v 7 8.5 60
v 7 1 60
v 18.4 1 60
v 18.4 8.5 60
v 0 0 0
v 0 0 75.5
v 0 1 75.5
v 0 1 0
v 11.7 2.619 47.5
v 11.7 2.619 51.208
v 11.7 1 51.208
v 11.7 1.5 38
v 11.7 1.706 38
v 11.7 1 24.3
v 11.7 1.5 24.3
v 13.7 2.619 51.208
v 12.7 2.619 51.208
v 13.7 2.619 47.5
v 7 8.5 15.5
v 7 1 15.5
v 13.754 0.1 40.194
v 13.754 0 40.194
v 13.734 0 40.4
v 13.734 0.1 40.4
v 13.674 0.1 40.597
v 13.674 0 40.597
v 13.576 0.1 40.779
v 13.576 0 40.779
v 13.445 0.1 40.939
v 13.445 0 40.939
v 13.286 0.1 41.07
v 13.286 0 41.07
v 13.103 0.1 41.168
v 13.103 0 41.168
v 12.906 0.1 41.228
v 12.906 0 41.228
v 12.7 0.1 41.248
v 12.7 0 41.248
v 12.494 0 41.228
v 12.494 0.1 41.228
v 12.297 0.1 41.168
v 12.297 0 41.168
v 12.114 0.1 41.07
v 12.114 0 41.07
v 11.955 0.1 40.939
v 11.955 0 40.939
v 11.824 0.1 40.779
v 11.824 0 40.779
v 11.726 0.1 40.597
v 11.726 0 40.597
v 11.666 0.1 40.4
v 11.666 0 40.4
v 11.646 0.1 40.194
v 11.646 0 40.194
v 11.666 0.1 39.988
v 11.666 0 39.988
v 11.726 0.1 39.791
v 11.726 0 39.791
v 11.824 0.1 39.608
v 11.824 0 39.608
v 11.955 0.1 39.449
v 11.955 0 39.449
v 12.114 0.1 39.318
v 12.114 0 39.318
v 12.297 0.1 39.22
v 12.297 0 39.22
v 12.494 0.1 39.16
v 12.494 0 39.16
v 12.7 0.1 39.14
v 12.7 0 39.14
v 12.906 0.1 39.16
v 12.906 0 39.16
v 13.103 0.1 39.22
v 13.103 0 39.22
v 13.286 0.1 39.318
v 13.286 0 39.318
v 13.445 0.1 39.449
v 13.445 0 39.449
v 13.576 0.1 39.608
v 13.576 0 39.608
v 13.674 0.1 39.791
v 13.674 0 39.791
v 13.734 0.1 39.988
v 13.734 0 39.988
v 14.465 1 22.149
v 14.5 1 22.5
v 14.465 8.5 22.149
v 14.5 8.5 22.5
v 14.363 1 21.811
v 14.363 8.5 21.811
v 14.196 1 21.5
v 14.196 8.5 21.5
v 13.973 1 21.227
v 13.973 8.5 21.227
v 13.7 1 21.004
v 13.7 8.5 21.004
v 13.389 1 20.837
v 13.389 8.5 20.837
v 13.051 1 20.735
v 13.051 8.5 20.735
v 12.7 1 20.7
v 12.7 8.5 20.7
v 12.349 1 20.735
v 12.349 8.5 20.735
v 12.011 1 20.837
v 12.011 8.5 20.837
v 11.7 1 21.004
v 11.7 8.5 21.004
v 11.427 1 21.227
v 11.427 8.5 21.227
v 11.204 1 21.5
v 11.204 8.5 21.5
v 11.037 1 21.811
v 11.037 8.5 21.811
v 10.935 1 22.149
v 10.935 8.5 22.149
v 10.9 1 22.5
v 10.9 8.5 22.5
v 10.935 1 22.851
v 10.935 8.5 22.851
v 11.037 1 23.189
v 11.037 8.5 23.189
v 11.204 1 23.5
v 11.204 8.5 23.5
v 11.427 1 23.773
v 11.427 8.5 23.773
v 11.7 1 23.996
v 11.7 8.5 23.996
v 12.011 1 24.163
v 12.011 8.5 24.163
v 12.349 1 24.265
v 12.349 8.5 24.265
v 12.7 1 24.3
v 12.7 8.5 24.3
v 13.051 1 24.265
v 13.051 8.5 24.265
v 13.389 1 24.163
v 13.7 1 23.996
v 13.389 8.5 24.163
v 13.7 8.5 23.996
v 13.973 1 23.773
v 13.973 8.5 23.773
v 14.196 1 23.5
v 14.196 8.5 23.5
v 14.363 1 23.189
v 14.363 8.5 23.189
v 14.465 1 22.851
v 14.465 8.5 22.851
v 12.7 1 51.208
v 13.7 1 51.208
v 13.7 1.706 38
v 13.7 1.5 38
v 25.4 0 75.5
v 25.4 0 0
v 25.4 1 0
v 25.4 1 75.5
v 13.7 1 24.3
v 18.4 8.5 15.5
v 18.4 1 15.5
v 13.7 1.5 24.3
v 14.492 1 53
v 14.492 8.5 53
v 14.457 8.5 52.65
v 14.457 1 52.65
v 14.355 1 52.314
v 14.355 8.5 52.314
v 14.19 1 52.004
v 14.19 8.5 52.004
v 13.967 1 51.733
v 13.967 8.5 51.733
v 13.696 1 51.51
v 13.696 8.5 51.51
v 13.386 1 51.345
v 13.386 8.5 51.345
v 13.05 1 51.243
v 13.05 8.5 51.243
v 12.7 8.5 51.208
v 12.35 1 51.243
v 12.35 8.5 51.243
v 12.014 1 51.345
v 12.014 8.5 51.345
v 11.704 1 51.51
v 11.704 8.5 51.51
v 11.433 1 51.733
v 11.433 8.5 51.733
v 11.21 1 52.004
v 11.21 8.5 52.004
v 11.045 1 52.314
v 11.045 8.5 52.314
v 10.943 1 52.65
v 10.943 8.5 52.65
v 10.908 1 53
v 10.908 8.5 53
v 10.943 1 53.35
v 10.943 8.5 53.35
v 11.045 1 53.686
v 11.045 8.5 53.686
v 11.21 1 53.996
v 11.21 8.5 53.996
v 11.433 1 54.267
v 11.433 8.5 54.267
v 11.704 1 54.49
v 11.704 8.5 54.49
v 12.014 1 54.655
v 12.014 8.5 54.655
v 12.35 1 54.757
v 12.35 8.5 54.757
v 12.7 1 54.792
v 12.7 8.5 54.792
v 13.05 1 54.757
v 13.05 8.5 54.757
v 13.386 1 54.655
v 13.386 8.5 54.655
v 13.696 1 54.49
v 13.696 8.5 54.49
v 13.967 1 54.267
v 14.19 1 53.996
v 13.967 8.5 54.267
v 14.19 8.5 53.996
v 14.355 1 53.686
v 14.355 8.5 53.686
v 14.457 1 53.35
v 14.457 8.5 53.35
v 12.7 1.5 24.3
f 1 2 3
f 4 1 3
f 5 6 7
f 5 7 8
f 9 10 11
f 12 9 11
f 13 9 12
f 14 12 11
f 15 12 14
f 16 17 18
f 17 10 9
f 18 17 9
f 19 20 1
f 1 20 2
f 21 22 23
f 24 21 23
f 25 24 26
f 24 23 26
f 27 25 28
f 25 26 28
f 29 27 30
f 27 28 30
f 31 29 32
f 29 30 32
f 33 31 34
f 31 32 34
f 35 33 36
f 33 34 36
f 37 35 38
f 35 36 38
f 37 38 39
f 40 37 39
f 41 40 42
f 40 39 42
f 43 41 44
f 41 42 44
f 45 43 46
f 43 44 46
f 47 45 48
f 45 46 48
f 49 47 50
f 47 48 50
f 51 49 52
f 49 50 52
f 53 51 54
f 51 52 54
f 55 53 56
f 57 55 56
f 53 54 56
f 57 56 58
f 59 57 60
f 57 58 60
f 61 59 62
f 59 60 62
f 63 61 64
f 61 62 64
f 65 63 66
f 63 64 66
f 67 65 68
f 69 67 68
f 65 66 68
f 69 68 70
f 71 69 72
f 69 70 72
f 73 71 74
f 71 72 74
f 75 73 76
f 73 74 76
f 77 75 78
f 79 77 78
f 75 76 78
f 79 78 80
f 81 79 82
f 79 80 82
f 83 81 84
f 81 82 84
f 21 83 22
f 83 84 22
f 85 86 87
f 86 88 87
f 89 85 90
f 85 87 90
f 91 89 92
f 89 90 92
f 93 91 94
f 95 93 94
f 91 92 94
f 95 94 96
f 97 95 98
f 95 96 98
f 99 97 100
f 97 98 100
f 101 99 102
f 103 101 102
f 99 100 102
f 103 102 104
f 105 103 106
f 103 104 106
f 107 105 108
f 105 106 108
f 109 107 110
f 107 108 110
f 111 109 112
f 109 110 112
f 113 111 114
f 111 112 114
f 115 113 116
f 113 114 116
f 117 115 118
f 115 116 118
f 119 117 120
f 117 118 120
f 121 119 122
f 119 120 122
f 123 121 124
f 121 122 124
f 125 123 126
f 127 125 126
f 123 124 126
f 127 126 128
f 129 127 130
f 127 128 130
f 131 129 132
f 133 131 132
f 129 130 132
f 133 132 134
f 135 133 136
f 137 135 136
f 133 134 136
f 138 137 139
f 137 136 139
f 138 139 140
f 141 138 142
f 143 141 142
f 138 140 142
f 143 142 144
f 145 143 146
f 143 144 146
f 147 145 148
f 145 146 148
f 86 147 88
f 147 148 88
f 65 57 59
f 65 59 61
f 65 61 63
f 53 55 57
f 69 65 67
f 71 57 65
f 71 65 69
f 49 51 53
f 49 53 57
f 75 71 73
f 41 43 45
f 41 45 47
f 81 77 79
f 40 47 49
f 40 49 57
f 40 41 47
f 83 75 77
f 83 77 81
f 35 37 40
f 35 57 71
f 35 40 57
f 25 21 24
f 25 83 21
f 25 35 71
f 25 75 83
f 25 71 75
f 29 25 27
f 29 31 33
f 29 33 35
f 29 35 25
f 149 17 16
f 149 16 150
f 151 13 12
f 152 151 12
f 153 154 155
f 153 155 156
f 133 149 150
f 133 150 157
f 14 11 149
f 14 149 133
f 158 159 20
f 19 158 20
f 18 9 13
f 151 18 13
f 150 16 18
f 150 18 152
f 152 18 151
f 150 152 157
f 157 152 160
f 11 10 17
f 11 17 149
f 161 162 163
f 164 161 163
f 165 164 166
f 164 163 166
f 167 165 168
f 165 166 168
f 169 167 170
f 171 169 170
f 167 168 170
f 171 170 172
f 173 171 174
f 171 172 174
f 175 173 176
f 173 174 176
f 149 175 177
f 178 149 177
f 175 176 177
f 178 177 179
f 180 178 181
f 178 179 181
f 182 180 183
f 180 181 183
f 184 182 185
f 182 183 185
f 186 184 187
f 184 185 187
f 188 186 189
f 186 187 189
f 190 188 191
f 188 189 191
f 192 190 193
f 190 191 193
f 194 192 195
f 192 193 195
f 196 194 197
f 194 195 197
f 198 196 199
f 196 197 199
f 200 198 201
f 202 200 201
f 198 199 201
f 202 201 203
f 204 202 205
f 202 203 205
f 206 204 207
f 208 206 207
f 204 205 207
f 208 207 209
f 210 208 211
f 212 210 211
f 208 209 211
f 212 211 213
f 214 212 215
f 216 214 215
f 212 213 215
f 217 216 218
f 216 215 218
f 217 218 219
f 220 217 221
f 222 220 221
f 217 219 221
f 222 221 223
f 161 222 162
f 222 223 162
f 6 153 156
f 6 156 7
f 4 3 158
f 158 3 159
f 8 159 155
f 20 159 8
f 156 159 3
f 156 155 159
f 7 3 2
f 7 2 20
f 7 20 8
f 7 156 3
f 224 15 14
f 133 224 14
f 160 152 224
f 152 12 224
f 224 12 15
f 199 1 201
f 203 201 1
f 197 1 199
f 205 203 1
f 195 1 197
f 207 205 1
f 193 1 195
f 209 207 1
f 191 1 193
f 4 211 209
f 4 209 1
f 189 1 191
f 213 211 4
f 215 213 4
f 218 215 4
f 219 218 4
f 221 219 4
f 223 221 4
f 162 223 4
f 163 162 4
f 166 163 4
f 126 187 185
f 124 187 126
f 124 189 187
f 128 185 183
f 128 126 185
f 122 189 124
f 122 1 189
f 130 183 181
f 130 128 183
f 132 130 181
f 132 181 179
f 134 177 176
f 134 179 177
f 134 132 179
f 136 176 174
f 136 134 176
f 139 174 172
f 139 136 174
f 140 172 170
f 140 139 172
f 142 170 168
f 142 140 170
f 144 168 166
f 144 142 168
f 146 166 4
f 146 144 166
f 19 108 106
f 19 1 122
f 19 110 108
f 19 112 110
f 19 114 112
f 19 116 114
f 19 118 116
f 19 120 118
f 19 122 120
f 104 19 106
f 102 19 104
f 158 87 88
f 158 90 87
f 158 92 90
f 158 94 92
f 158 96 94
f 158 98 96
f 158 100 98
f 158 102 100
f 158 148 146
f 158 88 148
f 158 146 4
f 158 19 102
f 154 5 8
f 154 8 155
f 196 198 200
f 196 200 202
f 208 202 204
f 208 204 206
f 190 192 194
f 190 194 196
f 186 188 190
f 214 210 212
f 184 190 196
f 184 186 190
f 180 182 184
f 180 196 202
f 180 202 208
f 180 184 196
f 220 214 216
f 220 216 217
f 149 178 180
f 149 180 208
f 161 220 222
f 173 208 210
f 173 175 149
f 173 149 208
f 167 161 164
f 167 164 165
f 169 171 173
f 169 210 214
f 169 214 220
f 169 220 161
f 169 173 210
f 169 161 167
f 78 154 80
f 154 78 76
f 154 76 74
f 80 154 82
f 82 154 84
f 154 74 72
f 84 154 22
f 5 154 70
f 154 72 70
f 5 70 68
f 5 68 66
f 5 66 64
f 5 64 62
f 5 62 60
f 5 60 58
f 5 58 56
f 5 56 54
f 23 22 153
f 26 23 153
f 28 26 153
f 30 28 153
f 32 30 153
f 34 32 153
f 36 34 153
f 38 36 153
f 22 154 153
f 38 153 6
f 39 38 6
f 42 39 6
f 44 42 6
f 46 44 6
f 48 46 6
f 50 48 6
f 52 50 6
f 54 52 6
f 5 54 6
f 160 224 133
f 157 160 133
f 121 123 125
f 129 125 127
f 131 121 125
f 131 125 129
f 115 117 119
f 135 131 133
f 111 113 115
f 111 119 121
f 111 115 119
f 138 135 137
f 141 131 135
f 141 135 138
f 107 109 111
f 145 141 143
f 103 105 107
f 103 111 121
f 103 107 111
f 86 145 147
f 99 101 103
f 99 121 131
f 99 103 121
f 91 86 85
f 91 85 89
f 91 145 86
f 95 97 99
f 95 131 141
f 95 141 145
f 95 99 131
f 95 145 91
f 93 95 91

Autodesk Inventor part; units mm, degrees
ref_plane "YZ Plane" through (0, 0, 0) normal (1, 0, 0) x (0, 1, 0)
ref_plane "XZ Plane" through (0, 0, 0) normal (0, 1, 0) x (-1, 0, 0)
ref_plane "XY Plane" through (0, 0, 0) normal (0, 0, 1) x (1, 0, 0)
sketch "Skizze1" plane through (0, 0, 0) normal (0, 1, 0) x (-1, 0, 0)
  line L0 (0, 0) -> (-25.4, 0)
  line L1 (-25.4, 0) -> (-25.4, 75.5)
  line L2 (-25.4, 75.5) -> (0, 75.5)
  line L3 (0, 75.5) -> (0, 0)
  dimension "d0" = 25.4
  dimension "d1" = 75.5
extrude "Extrusion1" add sketch "Skizze1" along normal blind 1
sketch "Skizze2" plane through (0, 1, 0) normal (0, 1, 0) x (1, 0, 0)
  line L0 (0, -75.5) -> (25.4, -75.5) projected
  line L1 (25.4, -75.5) -> (25.4, 0) projected
  line L2 (25.4, 0) -> (0, 0) projected
  line L3 (0, 0) -> (0, -75.5) projected
  line L4 (7, -60) -> (18.4, -60)
  line L5 (18.4, -60) -> (18.4, -15.5)
  line L6 (18.4, -15.5) -> (7, -15.5)
  line L7 (7, -15.5) -> (7, -60)
  dimension "d4" = 7
  dimension "d5" = 7
  dimension "d6" = 15.5
  dimension "d7" = 15.5
extrude "Extrusion2" add sketch "Skizze2" along normal blind 7.5 contours L7 L6 L5 L4
sketch "Skizze3" plane through (0, 8.5, 0) normal (0, 1, 0) x (1, 0, 0)
  line L0 (18.4, -60) -> (18.4, -15.5) projected
  line L1 (18.4, -15.5) -> (7, -15.5) projected
  line L2 (7, -15.5) -> (7, -60) projected
  line L3 (7, -60) -> (18.4, -60) projected
  circle A0 centre (12.7, -53) radius 1.7919
  circle A1 centre (12.7, -22.5) radius 1.7997
  point P0 (0, 0)
  dimension "d10" = 7
  dimension "d11" = 7
extrude "Extrusion3" cut sketch "Skizze3" against normal up to surface (7.5 mm away) contours A0 | A1
ref_plane "Arbeitsebene1" through (12.7, 0, 75.5) normal (1, 0, 0) x (0, 0, -1)
sketch "Skizze5" plane through (12.7, 1, 60) normal (1, 0, 0) x (0, 0, -1)
  line L0 (8.3796, 0.5) -> (36.1482, 0.5) projected
  line L1 (-15.5, 0) -> (60, 0) projected
  line L2 (8.7919, 7.5) -> (8.7919, 0) projected
  line L3 (8.7919, 1.6191) -> (12.5, 1.6191)
  line L4 (12.5, 1.6191) -> (22, 0.7063)
  line L5 (22, 0.7063) -> (22, 0.5)
  line L6 (36.1103, 0.5) -> (8.3796, 0.5) projected
  line L7 (0, 0) -> (0, 7.5) projected
  line L8 (-15.5, -1) -> (-15.5, 0) projected
  line L9 (60, -1) -> (60, 0) projected
  line L10 (35.7003, 7.5) -> (35.7003, 0) projected
  line L11 (44.5, 0) -> (0, 0) projected
  line L12 (35.7003, 0.5) -> (8.7919, 0.5)
  line L13 (8.7919, 0.5) -> (8.7919, 0)
  line L14 (8.7919, 0) -> (35.7003, 0)
  line L15 (35.7003, 0) -> (35.7003, 0.5)
  line L16 (8.7919, 1.6191) -> (8.7919, 0.5)
  point P0 (35.7003, 0.5)
  point P1 (22, 0.5)
  dimension "d17" = 28
  dimension "d18" = 38
extrude "Extrusion5" cut sketch "Skizze5" along normal mid plane 2
sketch "Skizze6" plane through (0, 0, 0) normal (0, -1, 0) x (1, 0, 0)
  line L0 (13.7, 47.5) -> (11.7, 47.5) projected
  line L1 (11.7, 38) -> (13.7, 38) projected
  circle A0 centre (12.7, 40.1939) radius 1.0539
  point P0 (0, 0)
extrude "Extrusion6" cut sketch "Skizze6" against normal blind 0.1
equation "\"d12\" = d11"
properties part number "00_chip"
